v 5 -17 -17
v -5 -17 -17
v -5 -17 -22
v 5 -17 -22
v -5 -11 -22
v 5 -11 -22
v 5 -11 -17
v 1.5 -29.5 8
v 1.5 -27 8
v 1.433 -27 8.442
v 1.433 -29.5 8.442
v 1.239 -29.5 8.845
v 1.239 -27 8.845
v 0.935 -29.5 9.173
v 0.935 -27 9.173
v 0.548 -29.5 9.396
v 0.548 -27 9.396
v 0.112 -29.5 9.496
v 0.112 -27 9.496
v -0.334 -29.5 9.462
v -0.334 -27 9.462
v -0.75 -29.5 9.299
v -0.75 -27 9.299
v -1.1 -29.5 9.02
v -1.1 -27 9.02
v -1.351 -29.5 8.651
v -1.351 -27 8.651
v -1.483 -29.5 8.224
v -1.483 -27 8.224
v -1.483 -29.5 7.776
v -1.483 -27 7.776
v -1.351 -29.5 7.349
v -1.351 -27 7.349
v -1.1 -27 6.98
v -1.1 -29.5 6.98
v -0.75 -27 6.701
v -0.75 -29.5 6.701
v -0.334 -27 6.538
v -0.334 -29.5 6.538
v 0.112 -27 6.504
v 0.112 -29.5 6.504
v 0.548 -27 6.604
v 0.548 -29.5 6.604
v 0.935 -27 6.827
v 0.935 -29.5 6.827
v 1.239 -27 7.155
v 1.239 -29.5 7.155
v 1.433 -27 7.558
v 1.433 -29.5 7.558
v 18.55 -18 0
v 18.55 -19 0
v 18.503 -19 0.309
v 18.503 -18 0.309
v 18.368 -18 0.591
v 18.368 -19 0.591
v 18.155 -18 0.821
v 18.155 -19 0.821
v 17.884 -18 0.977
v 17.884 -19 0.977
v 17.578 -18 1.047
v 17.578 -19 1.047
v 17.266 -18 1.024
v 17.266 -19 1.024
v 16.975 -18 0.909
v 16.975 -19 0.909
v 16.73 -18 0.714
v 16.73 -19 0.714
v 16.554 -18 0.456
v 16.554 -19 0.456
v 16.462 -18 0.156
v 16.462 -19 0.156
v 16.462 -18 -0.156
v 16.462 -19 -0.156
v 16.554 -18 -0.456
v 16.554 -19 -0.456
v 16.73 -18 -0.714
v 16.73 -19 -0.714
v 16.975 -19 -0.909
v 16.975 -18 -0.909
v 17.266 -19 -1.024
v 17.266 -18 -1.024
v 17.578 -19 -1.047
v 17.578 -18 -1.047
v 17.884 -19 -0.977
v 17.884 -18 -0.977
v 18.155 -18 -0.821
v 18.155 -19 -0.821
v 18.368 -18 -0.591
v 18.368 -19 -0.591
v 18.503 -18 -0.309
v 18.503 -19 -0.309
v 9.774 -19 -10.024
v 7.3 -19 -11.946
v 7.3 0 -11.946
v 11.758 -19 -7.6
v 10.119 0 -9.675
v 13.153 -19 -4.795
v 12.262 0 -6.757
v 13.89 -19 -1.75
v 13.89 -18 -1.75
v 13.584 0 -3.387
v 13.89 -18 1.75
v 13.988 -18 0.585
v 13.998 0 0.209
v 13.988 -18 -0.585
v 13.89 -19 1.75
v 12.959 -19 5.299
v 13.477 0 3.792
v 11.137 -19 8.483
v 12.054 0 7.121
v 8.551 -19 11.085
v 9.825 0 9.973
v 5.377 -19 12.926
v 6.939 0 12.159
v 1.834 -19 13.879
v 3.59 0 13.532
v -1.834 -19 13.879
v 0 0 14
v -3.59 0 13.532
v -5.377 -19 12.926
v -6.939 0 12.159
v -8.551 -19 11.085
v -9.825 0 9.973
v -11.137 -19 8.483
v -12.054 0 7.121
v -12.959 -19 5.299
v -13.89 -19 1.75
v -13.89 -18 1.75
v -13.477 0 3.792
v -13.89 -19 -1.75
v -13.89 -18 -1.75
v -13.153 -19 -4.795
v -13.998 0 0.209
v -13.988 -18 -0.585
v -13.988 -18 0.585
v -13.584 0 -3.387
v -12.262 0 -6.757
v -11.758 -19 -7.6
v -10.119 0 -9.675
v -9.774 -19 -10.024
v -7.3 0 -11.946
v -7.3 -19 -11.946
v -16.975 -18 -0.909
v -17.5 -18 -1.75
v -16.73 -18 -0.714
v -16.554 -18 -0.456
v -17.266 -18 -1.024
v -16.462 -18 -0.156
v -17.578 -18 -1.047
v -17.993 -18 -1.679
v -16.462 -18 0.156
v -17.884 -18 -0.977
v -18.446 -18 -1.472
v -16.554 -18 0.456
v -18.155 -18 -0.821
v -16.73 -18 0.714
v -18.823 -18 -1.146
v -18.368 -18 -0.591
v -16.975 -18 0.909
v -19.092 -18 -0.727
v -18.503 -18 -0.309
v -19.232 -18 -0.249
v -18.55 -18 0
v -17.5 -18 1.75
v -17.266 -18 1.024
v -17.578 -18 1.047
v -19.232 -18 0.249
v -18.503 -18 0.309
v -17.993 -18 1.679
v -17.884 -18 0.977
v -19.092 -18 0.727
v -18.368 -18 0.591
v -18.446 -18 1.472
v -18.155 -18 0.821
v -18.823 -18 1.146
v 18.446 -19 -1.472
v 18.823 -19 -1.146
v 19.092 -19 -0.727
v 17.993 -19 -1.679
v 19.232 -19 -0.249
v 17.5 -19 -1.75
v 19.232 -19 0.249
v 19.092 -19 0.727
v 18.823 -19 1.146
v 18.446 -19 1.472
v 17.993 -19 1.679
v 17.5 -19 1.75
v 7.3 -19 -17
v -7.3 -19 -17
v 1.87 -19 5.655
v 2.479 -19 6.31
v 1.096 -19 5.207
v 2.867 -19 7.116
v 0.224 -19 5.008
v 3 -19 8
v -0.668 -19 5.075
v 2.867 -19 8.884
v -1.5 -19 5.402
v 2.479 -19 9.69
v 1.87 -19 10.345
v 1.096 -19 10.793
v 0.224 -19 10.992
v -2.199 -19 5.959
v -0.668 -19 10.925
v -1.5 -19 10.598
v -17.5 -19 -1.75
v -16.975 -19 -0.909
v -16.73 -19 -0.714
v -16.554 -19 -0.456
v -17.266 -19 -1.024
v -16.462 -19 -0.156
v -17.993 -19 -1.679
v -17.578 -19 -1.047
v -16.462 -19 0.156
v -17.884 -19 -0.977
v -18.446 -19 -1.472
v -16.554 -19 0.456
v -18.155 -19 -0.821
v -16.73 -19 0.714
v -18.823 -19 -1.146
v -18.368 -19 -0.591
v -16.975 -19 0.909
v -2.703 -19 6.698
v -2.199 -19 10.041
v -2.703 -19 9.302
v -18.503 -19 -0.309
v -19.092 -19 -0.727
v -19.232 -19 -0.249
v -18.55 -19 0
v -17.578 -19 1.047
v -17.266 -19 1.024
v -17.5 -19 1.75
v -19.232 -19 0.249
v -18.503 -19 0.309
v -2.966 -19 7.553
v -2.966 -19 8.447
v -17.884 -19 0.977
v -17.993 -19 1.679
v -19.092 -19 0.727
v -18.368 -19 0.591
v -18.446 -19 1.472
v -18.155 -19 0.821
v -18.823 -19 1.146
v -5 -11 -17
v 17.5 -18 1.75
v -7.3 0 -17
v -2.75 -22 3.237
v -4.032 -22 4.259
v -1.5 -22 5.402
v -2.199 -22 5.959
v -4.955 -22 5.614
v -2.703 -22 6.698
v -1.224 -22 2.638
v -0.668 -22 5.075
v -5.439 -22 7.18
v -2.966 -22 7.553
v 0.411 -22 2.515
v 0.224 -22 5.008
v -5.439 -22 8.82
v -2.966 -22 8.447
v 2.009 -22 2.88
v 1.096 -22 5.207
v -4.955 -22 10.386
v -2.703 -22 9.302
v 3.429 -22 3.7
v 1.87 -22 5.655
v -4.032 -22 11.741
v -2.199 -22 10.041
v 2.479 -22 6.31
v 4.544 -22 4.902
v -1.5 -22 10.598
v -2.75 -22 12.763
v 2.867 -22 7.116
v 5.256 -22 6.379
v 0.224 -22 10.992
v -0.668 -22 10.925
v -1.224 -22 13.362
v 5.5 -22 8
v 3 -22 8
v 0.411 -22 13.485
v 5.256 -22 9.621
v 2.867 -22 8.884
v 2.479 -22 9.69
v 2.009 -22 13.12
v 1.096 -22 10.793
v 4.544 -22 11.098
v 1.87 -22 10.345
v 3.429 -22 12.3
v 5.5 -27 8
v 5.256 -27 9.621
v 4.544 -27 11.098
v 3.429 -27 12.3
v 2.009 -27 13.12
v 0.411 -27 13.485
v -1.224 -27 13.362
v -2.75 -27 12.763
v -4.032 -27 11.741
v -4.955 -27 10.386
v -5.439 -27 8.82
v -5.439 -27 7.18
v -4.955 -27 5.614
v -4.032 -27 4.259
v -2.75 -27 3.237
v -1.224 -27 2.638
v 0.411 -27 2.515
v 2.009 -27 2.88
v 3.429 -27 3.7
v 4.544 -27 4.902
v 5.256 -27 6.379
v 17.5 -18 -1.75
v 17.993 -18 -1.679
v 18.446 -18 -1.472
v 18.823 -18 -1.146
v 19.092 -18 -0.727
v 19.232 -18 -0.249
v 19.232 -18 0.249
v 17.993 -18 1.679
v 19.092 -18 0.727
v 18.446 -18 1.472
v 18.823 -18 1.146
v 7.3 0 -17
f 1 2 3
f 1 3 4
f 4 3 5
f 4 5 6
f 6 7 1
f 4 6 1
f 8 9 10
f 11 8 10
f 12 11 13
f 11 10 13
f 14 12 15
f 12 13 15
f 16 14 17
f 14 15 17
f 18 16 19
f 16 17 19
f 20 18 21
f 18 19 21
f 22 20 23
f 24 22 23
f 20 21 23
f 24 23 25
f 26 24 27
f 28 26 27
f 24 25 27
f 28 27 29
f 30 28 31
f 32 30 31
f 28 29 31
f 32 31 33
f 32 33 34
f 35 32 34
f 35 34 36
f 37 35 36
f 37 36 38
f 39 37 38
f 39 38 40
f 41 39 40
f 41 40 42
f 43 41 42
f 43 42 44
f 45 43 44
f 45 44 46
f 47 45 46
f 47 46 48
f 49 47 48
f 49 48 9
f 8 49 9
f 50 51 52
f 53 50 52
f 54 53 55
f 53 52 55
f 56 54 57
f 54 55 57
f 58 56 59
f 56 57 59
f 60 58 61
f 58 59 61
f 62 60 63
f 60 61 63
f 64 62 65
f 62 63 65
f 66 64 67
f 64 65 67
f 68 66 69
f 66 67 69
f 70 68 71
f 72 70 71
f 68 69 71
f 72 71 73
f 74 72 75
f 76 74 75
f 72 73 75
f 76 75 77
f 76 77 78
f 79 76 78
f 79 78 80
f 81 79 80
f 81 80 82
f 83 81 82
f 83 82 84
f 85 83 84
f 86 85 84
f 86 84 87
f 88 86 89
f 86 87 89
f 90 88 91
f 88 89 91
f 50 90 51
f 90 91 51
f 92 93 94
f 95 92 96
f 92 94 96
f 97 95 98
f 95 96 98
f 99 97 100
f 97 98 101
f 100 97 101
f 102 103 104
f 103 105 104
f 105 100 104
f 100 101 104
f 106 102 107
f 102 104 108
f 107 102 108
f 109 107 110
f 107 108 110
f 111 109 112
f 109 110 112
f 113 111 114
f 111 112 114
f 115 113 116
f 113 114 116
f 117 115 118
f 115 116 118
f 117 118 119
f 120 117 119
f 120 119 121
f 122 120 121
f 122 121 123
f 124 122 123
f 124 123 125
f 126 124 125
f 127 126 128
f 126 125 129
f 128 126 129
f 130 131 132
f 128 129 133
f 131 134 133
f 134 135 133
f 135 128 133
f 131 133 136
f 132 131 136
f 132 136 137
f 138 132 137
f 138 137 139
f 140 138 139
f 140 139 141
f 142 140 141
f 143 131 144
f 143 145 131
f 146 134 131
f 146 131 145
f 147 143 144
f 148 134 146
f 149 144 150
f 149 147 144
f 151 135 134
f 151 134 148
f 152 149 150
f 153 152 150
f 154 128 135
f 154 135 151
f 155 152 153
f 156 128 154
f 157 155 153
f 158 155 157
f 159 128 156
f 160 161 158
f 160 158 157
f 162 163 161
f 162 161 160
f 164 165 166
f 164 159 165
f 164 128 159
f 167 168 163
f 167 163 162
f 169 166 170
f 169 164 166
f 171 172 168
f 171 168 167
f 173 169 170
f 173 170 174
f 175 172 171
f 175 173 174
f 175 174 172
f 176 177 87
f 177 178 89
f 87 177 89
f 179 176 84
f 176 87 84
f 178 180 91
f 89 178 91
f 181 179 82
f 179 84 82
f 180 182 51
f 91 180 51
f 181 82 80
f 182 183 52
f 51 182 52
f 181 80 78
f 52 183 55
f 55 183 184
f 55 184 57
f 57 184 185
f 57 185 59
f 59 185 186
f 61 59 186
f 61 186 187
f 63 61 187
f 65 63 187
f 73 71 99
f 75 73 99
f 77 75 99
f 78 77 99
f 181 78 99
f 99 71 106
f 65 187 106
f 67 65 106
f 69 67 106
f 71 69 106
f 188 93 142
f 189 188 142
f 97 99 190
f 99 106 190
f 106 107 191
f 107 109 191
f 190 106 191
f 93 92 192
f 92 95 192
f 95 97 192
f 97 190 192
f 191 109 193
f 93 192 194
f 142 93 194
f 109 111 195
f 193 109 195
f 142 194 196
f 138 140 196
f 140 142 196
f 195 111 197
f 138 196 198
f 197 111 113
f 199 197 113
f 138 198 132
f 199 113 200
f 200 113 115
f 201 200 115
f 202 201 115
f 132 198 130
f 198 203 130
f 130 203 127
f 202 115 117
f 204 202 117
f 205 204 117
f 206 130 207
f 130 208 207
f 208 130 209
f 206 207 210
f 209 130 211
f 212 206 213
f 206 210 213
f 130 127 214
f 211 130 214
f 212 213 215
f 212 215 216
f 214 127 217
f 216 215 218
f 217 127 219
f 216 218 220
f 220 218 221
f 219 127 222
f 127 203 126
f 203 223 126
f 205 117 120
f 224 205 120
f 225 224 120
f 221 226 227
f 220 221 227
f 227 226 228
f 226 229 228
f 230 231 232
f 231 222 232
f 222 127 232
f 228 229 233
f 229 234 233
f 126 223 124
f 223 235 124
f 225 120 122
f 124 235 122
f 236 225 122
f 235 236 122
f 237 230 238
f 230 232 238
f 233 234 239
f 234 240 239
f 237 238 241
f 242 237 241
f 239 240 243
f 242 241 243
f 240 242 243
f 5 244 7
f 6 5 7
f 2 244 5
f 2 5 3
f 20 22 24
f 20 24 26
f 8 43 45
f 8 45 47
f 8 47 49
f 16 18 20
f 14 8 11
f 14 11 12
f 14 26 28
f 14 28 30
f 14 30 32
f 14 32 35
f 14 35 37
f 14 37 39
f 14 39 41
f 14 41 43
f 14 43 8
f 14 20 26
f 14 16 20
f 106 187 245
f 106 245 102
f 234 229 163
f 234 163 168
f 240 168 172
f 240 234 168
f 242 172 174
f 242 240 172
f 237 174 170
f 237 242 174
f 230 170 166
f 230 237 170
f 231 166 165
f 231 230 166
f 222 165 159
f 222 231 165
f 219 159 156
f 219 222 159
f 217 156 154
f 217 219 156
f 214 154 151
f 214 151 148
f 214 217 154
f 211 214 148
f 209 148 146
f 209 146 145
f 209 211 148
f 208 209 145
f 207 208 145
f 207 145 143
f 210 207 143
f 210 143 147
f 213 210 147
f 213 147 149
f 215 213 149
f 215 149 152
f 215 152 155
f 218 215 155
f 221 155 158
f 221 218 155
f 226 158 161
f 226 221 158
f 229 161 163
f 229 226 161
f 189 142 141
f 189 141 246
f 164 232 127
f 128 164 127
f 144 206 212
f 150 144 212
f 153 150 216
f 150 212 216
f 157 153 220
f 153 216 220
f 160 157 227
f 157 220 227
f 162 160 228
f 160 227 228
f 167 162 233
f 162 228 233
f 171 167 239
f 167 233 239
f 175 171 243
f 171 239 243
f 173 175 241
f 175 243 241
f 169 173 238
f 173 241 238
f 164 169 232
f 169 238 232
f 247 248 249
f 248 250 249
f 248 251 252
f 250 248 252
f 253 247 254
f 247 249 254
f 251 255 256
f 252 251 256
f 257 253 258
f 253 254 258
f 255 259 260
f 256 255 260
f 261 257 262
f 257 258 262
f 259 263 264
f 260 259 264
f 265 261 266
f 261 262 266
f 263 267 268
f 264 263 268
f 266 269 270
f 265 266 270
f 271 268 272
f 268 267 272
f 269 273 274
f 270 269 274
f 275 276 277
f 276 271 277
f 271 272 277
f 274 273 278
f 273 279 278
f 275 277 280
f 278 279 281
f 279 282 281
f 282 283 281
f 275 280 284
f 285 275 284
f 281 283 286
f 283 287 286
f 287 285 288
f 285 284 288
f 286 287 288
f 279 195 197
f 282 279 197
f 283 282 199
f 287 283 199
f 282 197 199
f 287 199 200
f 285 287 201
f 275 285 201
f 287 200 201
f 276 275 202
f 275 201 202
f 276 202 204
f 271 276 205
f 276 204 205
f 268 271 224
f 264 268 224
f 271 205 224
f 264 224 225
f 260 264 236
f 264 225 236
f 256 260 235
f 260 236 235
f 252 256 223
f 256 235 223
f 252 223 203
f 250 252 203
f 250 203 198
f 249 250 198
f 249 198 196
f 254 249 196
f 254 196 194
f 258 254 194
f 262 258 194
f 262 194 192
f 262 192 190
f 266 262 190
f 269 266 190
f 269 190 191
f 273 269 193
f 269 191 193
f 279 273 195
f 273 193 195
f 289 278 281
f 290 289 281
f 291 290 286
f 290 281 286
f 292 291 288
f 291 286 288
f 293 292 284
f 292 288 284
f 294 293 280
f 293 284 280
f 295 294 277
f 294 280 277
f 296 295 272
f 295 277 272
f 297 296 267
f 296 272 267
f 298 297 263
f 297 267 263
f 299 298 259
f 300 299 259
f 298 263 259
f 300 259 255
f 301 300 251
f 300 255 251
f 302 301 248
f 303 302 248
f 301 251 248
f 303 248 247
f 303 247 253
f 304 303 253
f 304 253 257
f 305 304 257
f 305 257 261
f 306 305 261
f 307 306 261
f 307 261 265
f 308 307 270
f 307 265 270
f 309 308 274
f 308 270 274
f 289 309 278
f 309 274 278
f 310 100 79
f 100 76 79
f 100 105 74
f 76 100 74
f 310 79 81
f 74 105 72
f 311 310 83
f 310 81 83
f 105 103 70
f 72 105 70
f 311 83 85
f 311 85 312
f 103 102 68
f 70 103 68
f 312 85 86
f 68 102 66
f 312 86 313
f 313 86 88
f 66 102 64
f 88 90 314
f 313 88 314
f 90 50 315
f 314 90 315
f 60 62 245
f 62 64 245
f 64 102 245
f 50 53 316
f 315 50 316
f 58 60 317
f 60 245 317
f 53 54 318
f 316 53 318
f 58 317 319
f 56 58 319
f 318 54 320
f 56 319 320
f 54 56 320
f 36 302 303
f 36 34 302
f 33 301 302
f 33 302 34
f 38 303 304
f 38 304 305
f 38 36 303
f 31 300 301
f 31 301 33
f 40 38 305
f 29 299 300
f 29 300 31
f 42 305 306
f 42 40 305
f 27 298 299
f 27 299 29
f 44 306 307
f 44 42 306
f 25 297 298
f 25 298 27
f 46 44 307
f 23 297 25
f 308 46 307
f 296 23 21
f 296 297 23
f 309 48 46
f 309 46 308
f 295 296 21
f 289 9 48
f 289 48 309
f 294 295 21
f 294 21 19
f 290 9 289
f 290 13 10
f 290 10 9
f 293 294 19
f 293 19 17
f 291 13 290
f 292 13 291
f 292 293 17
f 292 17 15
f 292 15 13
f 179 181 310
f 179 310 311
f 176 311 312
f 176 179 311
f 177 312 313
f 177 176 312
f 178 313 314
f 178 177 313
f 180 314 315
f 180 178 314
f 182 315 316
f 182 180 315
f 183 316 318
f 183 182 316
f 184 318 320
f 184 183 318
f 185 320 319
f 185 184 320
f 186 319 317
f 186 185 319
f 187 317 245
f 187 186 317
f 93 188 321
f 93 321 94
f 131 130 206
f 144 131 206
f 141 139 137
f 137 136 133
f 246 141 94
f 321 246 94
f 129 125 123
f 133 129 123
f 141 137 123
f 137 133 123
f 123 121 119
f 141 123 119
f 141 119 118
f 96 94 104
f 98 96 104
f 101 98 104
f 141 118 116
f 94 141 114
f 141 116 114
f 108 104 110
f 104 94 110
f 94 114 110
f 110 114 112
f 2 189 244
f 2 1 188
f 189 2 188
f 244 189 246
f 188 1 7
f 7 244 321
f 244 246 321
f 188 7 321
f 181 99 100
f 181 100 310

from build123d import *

# Parameters (mm, degrees)
F1_DEPTH  = 19
F2_R      = 3
F3_DEPTH  = 3
F4_R      = 1.5
F5_DEPTH  = 7.5
F6_R      = 1.05
F7_DEPTH  = 1
F8_R      = 5.5
F9_DEPTH  = 5
F10_W     = 10
F10_H     = 6
F11_DEPTH = 5


# Not quite as in the source:
# - a pattern or mirror of a feature is missing from the dataset's text; its kind, count and spacing are read off the source's solid


with BuildPart() as f1:
    # F0 (on Front) → F1 (new body)
    with BuildSketch(Plane.XZ):
        with BuildLine():
            Line((7.3, -17), (7.3, -11.9461290802))
            ThreePointArc((7.3, -11.9461290802), (0, 14), (-7.3, -11.9461290802))
            Line((-7.3, -11.9461290802), (-7.3, -17))
            Line((-7.3, -17), (7.3, -17))
        make_face()
    extrude(amount=F1_DEPTH)

    # F2 (on face) → F3 (join)
    with BuildSketch(Plane.XZ.offset(19)):
        with Locations((0, 8)):
            Circle(F2_R)
    extrude(amount=F3_DEPTH)

    # F4 (on face) → F5 (join)
    with BuildSketch(Plane.XZ.offset(22)):
        with Locations((0, 8)):
            Circle(F4_R)
    extrude(amount=F5_DEPTH)

    # F6 (on face) → F7 (join)
    with BuildSketch(Plane.XZ.offset(19)):
        with BuildLine():
            Line((13.8901943831, -1.75), (17.5, -1.75))
            ThreePointArc((17.5, -1.75), (19.25, 0), (17.5, 1.75))
            Line((17.5, 1.75), (13.8901943831, 1.75))
            Line((13.8901943831, 1.75), (13.8901943831, -1.75))
        make_face()
        with Locations((17.5, 0)):
            Circle(F6_R, mode=Mode.SUBTRACT)
    f7 = extrude(amount=-F7_DEPTH)

    # F7_copies: F7 across plane
    add(f7.mirror(Plane(origin=(0, 0, 0), x_dir=(0, 0, -1), z_dir=(-1, 0, 0))))

    # F8 (on face) → F9 (join)
    with BuildSketch(Plane.XZ.offset(22)):
        with Locations((0, 8)):
            Circle(F8_R)
    extrude(amount=F9_DEPTH)

    # F10 (on face) → F11 (join)
    with BuildSketch(Plane(origin=(0, 0, -17), x_dir=(1, 0, 0), z_dir=(0, 0, -1))):
        with Locations((0, 14)):
            Rectangle(F10_W, F10_H)
    extrude(amount=F11_DEPTH)


solid = f1.part
